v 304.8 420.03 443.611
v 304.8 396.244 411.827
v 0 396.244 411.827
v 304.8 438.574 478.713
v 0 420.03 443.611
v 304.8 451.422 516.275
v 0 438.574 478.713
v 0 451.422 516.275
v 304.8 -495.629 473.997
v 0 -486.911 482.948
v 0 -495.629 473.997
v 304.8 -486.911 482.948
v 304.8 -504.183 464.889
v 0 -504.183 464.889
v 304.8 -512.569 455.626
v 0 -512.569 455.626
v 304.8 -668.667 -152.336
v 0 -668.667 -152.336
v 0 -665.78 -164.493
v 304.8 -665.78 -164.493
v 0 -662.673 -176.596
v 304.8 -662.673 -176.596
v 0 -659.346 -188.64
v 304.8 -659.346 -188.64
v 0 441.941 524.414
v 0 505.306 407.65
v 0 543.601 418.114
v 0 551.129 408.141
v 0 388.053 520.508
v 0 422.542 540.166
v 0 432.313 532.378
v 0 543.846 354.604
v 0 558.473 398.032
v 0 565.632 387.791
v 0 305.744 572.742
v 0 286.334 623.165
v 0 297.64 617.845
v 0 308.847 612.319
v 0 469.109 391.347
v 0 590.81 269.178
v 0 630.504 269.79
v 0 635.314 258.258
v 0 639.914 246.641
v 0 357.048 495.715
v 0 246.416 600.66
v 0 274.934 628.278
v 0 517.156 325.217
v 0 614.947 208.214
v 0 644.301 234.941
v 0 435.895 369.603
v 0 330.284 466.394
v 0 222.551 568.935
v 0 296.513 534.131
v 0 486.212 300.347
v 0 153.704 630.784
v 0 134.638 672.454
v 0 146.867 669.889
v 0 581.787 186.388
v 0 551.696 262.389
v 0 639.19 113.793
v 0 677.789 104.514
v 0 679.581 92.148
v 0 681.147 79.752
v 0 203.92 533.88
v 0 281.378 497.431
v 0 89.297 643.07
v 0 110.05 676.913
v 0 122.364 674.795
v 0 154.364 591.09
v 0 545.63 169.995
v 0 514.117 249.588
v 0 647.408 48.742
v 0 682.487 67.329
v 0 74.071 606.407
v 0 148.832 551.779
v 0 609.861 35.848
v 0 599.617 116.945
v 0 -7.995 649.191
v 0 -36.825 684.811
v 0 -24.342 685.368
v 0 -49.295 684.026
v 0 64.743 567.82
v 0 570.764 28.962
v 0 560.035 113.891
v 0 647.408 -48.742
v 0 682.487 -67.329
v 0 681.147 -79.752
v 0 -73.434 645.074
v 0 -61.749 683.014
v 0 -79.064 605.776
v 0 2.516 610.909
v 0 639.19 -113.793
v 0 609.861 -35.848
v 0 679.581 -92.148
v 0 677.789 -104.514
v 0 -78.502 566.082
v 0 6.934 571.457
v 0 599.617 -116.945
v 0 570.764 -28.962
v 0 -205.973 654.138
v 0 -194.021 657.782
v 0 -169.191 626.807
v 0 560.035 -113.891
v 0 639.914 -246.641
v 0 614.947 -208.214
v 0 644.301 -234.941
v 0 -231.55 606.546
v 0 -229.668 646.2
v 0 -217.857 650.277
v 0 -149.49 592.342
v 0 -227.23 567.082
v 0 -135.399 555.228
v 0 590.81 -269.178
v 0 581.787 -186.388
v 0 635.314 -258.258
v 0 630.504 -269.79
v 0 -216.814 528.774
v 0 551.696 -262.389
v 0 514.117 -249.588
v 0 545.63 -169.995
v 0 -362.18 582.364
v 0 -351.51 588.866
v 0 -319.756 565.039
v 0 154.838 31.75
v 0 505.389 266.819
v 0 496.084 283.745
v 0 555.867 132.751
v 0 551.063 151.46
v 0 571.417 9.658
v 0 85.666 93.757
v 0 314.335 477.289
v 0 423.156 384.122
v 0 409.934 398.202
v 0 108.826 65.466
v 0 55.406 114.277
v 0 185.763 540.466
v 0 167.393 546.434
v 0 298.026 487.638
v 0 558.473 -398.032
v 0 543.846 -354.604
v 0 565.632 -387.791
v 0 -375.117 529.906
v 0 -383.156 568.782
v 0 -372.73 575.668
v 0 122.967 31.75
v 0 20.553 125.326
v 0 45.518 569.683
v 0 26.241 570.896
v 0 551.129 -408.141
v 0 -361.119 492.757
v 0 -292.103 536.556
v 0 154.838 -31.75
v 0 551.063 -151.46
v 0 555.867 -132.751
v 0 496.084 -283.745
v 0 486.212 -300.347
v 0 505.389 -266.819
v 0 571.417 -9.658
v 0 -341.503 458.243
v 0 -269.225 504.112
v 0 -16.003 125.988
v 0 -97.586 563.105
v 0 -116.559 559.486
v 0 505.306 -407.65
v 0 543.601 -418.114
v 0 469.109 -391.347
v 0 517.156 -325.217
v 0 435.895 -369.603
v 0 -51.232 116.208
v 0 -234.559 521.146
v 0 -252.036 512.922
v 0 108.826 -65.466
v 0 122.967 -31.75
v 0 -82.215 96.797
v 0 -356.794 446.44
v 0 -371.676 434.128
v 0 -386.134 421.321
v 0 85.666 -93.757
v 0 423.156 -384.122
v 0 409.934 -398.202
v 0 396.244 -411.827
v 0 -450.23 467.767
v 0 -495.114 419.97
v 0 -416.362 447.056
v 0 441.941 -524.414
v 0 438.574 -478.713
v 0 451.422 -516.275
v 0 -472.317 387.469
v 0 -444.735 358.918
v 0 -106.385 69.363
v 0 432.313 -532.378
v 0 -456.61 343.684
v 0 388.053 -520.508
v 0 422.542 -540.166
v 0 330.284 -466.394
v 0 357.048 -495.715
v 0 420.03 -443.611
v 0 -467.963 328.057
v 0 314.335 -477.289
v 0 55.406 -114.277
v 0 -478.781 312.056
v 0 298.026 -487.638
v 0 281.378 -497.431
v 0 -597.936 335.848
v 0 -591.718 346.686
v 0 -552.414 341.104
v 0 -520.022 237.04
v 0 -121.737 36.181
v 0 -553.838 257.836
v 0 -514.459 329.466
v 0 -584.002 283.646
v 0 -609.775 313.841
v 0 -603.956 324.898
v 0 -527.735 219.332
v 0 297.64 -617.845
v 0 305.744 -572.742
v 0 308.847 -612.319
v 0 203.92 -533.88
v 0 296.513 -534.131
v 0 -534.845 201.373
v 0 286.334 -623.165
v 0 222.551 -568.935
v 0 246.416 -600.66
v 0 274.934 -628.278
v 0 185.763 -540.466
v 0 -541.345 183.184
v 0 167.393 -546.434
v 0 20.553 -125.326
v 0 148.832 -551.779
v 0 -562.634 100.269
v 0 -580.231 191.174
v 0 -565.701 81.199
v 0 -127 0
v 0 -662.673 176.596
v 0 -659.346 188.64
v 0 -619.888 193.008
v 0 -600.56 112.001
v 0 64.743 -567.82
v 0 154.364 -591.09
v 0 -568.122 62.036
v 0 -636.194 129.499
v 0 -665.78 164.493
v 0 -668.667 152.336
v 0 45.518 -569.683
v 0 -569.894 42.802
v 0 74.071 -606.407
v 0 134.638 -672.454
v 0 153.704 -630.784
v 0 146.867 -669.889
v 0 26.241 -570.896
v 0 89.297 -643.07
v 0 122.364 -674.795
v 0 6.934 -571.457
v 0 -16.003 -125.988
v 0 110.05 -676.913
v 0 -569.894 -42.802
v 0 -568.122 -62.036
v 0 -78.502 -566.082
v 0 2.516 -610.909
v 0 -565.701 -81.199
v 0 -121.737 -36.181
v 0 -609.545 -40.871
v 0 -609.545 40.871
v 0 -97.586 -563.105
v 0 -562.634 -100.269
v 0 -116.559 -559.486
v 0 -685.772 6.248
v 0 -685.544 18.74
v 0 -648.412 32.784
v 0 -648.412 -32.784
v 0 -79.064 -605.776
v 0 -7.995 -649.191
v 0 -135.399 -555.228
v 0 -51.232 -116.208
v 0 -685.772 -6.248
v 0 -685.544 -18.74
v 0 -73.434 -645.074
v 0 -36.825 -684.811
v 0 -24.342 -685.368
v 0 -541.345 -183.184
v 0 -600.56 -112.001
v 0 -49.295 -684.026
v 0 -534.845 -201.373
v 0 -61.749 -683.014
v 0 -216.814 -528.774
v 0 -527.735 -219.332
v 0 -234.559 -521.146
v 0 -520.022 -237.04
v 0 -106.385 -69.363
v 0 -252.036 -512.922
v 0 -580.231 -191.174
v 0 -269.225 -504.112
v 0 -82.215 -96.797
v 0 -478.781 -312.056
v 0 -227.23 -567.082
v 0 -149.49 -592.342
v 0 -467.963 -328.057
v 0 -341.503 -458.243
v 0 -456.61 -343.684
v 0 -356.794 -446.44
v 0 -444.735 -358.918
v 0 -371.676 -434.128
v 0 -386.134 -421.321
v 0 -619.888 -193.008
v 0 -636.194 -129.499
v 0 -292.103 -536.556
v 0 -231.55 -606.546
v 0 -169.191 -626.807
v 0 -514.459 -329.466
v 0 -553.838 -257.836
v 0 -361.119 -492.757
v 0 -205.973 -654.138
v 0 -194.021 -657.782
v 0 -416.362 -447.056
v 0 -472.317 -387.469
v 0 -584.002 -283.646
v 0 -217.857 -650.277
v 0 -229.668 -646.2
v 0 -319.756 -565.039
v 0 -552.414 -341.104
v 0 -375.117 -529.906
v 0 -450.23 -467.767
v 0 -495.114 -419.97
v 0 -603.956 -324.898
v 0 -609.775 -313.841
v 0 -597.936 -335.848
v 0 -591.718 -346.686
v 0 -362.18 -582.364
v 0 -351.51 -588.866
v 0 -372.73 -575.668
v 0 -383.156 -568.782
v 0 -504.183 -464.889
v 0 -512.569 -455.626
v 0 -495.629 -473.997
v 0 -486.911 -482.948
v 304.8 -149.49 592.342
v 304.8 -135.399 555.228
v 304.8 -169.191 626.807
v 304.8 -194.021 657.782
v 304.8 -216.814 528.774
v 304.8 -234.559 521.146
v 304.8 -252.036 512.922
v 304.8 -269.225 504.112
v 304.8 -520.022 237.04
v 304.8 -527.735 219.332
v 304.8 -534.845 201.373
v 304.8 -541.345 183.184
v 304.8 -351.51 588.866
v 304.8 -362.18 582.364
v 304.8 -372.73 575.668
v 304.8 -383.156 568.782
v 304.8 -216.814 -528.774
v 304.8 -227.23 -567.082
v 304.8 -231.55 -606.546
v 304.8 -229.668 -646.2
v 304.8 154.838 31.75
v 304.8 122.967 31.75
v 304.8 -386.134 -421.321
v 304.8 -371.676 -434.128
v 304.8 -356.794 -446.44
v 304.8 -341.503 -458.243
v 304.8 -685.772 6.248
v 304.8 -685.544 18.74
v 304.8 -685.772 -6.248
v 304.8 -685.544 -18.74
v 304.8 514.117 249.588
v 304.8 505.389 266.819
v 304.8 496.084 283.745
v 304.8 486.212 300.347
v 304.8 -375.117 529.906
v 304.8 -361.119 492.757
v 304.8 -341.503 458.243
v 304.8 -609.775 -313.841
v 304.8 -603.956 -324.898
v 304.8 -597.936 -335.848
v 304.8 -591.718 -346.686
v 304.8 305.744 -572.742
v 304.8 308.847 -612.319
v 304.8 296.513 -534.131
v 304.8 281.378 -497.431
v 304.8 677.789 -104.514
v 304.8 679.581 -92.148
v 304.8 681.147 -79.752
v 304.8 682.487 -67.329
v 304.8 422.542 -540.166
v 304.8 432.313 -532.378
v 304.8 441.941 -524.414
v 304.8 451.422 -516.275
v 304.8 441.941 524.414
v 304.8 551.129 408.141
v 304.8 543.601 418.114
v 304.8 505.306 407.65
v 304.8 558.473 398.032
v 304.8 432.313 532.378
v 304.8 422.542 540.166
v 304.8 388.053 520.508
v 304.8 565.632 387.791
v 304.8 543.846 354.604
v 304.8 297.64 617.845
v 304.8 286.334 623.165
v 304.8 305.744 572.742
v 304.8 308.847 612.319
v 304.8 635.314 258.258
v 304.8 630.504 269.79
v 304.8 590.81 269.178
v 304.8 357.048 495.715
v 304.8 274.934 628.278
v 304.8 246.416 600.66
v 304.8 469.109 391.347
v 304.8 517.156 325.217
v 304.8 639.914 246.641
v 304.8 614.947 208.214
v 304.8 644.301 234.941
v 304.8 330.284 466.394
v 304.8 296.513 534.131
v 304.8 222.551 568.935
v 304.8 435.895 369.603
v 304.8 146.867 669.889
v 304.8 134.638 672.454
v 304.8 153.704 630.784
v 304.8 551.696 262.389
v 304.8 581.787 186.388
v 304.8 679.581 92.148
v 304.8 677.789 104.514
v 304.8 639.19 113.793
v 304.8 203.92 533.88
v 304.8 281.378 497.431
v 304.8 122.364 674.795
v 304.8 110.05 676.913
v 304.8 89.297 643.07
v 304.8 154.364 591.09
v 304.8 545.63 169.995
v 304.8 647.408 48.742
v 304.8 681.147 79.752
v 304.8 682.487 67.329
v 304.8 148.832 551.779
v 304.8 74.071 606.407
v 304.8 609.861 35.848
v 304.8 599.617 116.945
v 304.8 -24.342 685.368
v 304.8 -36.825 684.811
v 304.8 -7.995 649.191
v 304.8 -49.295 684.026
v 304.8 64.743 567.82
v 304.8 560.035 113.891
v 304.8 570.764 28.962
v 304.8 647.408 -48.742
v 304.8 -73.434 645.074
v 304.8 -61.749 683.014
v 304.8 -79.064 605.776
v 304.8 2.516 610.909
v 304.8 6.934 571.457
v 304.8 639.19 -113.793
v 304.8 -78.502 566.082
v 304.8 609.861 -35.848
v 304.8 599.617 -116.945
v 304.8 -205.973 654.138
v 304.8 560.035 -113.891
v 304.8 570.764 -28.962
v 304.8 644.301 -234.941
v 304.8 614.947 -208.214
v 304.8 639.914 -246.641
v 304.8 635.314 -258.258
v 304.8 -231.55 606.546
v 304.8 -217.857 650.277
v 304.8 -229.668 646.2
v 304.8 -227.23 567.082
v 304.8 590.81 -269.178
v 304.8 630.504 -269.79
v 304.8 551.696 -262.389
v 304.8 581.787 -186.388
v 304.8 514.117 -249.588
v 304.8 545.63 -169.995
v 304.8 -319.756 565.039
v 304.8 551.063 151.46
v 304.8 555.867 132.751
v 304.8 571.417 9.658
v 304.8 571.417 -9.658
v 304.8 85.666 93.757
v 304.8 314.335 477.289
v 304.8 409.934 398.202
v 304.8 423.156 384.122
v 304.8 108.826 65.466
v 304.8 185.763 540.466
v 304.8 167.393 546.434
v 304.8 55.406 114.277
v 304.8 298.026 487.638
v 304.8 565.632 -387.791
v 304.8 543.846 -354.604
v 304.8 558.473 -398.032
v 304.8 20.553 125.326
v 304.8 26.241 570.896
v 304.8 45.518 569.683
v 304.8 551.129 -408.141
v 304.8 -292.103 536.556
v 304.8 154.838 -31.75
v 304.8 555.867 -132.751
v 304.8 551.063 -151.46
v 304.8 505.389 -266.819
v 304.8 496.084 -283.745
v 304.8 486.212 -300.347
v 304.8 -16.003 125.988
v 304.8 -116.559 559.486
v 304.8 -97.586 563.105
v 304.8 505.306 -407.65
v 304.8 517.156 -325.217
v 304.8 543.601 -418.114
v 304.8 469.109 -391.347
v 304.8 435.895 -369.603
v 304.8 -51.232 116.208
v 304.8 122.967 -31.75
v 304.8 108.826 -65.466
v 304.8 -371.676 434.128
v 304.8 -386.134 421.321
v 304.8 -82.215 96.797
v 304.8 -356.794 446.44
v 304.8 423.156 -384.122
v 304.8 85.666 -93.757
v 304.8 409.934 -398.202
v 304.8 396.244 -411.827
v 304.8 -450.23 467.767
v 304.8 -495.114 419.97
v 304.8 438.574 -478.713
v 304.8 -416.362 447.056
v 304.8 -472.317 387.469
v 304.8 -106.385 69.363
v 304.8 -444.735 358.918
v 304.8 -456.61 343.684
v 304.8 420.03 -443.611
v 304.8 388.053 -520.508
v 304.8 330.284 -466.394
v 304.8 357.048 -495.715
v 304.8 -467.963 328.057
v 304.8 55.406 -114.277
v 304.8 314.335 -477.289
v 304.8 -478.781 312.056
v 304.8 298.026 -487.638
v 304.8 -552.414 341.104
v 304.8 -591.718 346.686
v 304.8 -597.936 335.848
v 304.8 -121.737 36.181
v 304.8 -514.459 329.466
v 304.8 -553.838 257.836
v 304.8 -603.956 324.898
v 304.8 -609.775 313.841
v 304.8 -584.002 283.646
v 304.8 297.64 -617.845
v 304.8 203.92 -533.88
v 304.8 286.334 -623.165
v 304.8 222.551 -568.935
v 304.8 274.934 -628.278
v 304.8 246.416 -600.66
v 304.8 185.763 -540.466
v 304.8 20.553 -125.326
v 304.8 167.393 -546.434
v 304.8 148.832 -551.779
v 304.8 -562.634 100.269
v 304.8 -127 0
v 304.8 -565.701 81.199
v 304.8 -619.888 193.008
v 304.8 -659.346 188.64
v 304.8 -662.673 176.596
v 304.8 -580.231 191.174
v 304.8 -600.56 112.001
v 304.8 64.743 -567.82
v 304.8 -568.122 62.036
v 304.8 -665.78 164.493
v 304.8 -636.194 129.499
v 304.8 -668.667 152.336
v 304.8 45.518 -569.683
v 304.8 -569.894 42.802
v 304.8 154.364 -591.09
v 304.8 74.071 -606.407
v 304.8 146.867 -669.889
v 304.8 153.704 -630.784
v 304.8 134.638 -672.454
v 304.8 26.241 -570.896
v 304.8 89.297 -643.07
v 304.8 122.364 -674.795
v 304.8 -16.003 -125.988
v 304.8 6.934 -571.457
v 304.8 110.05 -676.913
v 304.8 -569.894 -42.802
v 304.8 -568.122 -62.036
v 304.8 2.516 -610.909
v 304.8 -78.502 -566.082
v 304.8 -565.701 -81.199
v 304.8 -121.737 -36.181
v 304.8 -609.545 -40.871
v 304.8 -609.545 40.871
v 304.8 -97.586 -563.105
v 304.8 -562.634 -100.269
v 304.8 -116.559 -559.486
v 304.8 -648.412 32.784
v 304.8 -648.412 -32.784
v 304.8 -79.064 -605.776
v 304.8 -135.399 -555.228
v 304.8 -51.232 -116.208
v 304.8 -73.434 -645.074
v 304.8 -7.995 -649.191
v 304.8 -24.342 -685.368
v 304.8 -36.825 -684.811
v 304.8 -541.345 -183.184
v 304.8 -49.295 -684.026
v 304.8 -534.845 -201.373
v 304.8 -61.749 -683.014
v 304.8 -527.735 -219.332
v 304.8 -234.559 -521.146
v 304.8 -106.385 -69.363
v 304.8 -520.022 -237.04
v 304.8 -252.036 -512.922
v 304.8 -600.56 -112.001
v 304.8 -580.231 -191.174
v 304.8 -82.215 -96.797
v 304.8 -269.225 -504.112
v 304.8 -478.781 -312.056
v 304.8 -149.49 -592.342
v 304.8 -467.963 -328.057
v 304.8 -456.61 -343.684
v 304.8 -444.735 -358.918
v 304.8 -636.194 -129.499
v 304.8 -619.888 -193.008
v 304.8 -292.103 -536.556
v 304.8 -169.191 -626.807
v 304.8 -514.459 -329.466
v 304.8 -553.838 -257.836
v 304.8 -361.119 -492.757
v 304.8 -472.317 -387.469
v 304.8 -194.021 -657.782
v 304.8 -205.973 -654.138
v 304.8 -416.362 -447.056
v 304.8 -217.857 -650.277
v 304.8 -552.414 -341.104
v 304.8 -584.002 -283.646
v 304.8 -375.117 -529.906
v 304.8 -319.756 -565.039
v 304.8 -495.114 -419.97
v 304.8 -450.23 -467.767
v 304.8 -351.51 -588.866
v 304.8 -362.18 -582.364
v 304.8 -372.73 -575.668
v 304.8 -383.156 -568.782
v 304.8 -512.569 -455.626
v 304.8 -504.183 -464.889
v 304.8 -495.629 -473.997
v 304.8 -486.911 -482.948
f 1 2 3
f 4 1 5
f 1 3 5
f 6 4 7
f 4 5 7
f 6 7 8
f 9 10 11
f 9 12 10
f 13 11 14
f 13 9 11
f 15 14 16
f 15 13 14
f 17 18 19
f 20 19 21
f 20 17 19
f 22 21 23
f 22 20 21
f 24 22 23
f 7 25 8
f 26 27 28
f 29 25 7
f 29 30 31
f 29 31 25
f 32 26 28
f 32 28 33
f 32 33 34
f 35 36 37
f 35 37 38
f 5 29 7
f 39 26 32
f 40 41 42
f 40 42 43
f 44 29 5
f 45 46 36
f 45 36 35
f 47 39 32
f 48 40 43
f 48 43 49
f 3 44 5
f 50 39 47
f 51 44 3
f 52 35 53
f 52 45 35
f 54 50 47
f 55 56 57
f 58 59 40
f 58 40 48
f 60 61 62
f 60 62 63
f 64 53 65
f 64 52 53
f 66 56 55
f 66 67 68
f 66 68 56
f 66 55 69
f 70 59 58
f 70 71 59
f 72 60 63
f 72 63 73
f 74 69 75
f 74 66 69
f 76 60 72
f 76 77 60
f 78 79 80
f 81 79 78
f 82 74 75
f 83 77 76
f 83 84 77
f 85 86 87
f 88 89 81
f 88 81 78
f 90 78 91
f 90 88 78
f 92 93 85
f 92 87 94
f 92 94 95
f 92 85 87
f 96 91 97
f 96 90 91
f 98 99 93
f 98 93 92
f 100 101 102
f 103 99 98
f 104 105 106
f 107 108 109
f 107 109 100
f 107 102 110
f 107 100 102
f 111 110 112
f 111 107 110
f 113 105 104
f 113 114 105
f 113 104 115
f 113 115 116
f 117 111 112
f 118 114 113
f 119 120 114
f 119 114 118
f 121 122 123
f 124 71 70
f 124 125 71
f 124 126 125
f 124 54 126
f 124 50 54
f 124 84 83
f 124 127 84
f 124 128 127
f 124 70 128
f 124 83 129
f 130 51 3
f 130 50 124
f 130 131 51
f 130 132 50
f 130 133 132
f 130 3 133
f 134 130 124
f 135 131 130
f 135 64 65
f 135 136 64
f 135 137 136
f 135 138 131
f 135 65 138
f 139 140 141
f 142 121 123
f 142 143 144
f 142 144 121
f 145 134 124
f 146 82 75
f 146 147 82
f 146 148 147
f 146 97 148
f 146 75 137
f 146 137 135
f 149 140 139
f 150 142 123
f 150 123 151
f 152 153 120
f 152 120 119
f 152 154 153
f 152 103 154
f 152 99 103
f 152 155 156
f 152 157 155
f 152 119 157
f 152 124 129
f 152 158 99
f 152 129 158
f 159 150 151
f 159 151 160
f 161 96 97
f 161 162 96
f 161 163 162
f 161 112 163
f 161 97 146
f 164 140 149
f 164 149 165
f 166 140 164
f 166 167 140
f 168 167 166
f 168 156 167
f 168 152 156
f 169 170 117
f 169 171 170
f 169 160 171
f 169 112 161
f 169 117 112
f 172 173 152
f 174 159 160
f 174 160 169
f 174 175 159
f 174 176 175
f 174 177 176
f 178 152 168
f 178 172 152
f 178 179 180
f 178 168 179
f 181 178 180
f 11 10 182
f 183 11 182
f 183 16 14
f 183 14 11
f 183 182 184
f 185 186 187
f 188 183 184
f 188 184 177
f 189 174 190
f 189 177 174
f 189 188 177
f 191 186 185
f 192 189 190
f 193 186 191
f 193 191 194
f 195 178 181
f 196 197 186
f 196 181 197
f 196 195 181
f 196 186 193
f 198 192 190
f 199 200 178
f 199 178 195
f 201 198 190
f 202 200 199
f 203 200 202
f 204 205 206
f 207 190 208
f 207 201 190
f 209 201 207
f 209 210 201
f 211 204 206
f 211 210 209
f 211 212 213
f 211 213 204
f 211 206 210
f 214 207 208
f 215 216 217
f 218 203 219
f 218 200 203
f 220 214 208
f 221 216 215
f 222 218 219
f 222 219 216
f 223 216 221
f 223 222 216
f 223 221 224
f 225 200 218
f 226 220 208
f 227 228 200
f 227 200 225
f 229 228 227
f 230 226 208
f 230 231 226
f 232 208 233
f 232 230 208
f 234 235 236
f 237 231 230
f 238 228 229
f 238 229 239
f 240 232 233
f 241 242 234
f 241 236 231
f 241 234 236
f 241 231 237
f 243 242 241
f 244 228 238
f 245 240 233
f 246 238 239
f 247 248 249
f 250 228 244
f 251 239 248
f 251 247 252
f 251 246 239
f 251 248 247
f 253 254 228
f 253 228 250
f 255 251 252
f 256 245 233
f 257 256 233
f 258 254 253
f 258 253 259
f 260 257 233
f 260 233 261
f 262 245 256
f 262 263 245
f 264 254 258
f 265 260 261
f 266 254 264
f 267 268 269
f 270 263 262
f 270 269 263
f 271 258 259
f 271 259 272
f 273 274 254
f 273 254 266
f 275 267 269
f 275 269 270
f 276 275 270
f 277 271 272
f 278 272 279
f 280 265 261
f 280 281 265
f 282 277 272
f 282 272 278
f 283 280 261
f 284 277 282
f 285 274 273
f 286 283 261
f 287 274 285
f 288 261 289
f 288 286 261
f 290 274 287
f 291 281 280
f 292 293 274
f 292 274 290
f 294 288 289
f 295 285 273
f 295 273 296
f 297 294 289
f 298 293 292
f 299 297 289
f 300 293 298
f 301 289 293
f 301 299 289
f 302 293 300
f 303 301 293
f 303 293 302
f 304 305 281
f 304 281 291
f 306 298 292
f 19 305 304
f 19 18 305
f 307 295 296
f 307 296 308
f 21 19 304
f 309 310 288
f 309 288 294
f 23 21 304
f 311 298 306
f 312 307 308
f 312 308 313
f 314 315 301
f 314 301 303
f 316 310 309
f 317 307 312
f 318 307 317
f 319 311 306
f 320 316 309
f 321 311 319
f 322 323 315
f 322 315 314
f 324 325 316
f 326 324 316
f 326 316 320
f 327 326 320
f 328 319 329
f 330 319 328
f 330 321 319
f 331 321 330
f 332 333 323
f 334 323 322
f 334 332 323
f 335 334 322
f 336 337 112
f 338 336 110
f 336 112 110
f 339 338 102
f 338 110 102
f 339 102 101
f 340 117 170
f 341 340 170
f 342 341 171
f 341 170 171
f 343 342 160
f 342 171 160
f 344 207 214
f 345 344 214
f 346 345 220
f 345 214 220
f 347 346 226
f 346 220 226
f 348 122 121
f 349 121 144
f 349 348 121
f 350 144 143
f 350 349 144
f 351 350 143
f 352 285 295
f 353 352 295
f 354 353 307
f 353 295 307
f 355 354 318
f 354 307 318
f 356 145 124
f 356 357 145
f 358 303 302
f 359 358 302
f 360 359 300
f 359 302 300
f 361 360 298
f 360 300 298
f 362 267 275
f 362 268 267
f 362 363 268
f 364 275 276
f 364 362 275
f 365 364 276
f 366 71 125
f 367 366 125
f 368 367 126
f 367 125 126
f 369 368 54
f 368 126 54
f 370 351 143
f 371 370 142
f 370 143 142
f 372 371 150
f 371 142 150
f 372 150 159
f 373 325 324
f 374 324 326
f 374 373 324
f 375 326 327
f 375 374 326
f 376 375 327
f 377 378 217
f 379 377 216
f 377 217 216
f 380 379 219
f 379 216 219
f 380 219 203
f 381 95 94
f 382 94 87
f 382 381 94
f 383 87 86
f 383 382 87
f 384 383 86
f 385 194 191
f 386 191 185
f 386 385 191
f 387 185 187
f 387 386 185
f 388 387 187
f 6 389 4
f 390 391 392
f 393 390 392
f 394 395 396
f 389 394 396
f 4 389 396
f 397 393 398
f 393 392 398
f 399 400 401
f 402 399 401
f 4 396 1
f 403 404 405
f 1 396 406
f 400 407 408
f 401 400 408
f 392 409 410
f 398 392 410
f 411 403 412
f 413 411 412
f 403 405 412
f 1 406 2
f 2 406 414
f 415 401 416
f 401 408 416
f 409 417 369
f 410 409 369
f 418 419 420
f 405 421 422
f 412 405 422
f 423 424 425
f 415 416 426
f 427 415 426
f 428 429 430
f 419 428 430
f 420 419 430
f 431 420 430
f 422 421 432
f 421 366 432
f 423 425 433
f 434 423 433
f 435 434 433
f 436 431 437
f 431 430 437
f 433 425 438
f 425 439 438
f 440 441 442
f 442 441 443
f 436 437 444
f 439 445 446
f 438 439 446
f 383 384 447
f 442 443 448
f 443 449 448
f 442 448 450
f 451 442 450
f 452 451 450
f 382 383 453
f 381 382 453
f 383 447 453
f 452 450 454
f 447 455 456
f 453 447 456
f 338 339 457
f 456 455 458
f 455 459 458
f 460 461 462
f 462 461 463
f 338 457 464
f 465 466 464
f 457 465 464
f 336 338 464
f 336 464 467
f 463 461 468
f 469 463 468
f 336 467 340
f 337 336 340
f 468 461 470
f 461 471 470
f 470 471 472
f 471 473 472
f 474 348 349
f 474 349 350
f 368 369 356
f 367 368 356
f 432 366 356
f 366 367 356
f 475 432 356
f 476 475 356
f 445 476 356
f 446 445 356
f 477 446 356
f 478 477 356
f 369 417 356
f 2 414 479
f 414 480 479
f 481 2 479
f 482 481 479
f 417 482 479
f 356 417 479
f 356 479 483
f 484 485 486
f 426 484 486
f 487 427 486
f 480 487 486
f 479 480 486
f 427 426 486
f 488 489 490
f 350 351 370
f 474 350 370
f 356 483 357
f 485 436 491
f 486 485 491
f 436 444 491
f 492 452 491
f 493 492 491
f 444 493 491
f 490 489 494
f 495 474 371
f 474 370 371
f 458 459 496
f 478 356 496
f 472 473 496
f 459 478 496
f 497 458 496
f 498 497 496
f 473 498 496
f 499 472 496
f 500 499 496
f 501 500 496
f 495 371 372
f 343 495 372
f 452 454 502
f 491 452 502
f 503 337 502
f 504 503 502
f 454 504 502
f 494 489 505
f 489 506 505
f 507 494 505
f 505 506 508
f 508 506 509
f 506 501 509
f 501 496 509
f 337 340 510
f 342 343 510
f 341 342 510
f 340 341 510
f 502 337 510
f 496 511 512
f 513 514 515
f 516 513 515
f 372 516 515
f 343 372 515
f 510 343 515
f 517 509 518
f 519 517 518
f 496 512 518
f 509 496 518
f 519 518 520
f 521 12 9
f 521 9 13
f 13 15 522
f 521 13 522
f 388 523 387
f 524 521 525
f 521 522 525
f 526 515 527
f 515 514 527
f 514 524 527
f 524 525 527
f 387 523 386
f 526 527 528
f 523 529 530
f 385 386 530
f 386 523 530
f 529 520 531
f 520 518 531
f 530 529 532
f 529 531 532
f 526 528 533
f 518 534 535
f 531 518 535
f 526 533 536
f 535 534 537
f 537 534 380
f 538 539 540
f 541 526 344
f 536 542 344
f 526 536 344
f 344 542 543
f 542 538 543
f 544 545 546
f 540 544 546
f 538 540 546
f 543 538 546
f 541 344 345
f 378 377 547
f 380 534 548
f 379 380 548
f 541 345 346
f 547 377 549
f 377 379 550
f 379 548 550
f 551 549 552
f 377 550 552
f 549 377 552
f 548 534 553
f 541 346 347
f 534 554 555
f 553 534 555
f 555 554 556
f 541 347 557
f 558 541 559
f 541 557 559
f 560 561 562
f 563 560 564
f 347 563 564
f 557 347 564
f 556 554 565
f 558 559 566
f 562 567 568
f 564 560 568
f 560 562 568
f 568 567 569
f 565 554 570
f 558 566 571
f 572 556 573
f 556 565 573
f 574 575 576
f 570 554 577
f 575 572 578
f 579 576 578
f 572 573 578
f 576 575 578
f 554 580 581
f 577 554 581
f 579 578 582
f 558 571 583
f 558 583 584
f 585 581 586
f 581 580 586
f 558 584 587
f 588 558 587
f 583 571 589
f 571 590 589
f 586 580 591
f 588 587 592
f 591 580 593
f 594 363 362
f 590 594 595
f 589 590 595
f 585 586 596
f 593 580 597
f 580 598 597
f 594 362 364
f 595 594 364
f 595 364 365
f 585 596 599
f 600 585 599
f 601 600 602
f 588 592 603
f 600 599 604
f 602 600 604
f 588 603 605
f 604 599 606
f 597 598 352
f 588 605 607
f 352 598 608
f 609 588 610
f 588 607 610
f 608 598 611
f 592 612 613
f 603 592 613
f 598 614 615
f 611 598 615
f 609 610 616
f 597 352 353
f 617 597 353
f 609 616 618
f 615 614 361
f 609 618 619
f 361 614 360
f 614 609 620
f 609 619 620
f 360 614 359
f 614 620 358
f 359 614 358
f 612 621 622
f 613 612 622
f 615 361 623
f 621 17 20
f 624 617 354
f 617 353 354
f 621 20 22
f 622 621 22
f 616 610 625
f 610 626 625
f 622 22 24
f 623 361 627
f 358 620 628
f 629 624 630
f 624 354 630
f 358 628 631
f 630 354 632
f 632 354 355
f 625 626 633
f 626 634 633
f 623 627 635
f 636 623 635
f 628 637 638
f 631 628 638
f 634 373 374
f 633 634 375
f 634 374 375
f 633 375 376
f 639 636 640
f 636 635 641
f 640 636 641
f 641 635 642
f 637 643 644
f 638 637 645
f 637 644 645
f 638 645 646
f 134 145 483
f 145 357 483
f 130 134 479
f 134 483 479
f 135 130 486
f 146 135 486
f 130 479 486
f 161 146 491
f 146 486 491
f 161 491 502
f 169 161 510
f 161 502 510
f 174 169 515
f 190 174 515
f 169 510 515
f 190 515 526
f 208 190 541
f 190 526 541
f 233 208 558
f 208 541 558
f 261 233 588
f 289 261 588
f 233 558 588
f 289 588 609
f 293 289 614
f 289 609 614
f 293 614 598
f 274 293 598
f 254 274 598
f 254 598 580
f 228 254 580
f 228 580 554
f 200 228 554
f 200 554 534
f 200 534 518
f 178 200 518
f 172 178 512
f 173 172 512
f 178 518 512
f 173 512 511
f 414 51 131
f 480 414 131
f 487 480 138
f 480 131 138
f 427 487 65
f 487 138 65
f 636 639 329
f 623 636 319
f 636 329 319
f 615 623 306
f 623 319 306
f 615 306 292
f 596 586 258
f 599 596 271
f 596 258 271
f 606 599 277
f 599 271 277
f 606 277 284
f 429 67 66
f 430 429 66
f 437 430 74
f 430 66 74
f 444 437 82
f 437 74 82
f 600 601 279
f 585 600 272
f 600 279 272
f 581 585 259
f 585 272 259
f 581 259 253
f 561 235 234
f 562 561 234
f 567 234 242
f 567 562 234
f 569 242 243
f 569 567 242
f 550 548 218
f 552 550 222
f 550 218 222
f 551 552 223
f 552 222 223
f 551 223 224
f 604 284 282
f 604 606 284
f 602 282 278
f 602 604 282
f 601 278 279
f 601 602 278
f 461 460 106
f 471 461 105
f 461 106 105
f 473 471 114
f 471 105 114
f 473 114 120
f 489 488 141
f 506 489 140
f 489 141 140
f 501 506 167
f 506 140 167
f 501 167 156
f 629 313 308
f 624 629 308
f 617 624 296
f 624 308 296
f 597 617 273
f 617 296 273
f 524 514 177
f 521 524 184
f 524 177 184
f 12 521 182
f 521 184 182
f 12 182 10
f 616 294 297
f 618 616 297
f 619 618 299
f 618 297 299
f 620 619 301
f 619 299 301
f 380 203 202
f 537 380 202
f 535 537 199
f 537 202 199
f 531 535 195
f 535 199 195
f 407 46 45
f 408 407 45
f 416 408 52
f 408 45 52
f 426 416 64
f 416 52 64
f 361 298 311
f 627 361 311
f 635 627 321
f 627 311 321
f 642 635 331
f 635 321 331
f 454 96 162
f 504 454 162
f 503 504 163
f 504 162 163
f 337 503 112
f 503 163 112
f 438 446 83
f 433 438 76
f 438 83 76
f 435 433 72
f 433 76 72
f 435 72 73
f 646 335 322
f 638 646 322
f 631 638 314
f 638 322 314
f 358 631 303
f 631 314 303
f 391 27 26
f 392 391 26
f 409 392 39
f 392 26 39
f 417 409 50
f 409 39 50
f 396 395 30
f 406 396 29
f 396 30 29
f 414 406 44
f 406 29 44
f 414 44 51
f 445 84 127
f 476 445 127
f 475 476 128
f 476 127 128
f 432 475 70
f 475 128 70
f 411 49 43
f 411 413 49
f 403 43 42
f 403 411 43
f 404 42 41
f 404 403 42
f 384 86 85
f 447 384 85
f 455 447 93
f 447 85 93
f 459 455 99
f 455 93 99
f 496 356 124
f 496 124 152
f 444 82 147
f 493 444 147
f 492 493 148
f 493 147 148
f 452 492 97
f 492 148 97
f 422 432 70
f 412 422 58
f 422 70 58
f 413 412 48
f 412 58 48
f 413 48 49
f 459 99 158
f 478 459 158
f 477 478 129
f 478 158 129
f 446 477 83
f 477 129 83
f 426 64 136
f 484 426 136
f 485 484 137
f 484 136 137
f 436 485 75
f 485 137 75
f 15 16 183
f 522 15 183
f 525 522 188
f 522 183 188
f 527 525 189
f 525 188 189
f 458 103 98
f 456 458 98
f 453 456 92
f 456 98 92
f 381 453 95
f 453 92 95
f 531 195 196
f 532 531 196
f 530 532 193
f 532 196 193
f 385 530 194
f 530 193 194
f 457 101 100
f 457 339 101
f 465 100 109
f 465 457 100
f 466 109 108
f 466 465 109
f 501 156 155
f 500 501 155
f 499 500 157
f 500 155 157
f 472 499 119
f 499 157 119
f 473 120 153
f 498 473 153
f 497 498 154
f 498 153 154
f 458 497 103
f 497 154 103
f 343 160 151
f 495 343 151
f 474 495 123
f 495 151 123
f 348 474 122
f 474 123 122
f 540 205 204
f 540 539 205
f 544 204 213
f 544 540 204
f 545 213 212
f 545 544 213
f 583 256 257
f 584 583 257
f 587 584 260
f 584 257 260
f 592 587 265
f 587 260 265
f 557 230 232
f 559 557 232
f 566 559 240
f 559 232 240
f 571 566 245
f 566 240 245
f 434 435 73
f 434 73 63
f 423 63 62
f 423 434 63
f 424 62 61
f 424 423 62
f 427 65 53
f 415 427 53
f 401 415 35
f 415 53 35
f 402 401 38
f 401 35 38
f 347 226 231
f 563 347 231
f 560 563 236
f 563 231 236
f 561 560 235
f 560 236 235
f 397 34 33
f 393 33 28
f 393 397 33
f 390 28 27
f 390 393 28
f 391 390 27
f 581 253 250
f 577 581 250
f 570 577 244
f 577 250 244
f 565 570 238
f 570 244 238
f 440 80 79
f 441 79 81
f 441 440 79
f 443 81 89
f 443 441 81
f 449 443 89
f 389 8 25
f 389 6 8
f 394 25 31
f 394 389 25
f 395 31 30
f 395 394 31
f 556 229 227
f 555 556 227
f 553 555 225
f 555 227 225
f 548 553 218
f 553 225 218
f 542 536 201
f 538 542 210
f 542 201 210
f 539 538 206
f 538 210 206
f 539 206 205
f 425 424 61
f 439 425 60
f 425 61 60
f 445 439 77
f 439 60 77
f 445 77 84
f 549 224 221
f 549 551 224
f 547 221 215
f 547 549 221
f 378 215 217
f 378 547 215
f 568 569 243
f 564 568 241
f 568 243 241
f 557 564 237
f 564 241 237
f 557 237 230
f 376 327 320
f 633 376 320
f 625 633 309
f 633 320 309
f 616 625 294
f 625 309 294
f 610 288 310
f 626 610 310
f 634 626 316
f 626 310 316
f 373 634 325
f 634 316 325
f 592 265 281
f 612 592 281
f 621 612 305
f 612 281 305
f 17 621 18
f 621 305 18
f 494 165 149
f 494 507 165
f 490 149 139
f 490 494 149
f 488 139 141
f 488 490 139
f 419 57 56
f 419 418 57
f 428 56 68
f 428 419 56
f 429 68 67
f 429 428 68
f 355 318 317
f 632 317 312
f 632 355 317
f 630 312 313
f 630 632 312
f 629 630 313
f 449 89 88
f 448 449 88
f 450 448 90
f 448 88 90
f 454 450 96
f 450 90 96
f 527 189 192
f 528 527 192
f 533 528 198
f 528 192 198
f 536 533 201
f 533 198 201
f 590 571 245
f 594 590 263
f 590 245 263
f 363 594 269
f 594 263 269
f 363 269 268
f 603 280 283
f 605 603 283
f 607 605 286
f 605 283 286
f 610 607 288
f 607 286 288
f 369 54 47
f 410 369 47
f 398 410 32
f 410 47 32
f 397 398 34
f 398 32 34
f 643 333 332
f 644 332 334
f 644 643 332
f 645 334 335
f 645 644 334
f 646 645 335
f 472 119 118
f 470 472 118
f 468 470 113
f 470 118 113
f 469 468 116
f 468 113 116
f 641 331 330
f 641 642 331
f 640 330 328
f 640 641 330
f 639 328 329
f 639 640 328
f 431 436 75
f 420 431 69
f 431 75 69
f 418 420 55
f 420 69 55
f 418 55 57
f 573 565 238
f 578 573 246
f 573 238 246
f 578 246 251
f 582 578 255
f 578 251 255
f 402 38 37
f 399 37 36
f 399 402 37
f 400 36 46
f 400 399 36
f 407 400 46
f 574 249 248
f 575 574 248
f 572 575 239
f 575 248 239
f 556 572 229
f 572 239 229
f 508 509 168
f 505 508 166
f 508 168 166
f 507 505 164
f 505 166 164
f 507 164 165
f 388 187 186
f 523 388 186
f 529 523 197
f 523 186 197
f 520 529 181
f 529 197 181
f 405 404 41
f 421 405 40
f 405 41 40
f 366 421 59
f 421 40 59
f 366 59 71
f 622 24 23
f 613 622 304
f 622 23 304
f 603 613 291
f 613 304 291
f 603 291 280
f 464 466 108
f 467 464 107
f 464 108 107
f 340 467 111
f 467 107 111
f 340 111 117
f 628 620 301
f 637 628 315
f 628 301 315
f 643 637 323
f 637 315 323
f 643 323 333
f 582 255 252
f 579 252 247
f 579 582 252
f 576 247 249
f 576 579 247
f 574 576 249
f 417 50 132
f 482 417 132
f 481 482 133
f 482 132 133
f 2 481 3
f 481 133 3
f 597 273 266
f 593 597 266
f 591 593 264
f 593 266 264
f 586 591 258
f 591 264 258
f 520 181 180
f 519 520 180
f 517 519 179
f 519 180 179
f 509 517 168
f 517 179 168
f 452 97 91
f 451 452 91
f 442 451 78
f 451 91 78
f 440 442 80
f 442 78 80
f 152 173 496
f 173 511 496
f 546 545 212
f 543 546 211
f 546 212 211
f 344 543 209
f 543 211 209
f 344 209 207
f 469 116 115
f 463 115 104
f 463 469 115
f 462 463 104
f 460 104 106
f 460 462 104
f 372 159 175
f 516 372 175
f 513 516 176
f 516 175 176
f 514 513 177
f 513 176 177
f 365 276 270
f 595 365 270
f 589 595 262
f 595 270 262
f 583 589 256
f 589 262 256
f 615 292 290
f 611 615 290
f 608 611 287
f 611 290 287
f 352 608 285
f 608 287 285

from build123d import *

# Parameters (mm, degrees)
BASPROSKE_W     = 304.8
BASPROSKE_H     = 685.8
TOOTHCUT_DEPTH  = 1017.634801686
TEETHCUTS_COUNT = 25
TEETHCUTS_ANGLE = 345.6
BORSKE_R        = 127
BORE_DEPTH      = 304.8000508
KEYSKE_W        = 63.5
KEYSKE_H        = 154.8384
KEYWAY_DEPTH    = 304.8000508


with BuildPart() as part:
    # BasProSke → Base-Revolve (revolve)
    with BuildSketch(Plane(origin=(0, 0, 0), x_dir=(1, 0, 0), z_dir=(0, 1, 0)), mode=Mode.PRIVATE) as base_revolve_sk:
        with Locations((152.4, 342.9)):
            Rectangle(BASPROSKE_W, BASPROSKE_H)
    revolve(base_revolve_sk.sketch.rotate(Axis((-10, 0, 0), (1, 0, 0)), 180), axis=Axis((-10, 0, 0), (1, 0, 0)))

    # TooCutSke → ToothCut (cut, through all)
    with BuildSketch(Plane(origin=(0, 0, 0), x_dir=(0, 0, -1), z_dir=(1, 0, 0))):
        with BuildLine():
            ThreePointArc((28.961853932, 570.764407973), (0, 571.49873), (-28.961853932, 570.764407973))
            ThreePointArc((-28.961853932, 570.764407973), (-41.564862504, 628.900535379), (-67.343982953, 682.511001556))
            ThreePointArc((-67.343982953, 682.511001556), (0, 685.8254), (67.343982953, 682.511001556))
            ThreePointArc((67.343982953, 682.511001556), (41.564862504, 628.900535379), (28.961853932, 570.764407973))
        make_face()
    toothcut = extrude(amount=TOOTHCUT_DEPTH, mode=Mode.SUBTRACT)

    # TeethCuts: ToothCut ×25 about axis
    teethcuts_axis = Axis((-10, 0, 0), (1, 0, 0))
    for i in range(1, TEETHCUTS_COUNT):
        add(toothcut.rotate(teethcuts_axis, i * TEETHCUTS_ANGLE / (TEETHCUTS_COUNT - 1)), mode=Mode.SUBTRACT)

    # BorSke → Bore (cut, symmetric)
    with BuildSketch(Plane(origin=(0, 0, 0), x_dir=(0, 0, -1), z_dir=(1, 0, 0))):
        with Locations(Location((0, 0, 0), (0, 0, 180))):
            Circle(BORSKE_R)
    extrude(amount=BORE_DEPTH, both=True, mode=Mode.SUBTRACT)

    # KeySke → Keyway (cut, symmetric)
    with BuildSketch(Plane(origin=(0, 0, 0), x_dir=(0, 0, -1), z_dir=(1, 0, 0))):
        with Locations((0, 77.4192)):
            Rectangle(KEYSKE_W, KEYSKE_H)
    extrude(amount=KEYWAY_DEPTH, both=True, mode=Mode.SUBTRACT)


solid = part.part
